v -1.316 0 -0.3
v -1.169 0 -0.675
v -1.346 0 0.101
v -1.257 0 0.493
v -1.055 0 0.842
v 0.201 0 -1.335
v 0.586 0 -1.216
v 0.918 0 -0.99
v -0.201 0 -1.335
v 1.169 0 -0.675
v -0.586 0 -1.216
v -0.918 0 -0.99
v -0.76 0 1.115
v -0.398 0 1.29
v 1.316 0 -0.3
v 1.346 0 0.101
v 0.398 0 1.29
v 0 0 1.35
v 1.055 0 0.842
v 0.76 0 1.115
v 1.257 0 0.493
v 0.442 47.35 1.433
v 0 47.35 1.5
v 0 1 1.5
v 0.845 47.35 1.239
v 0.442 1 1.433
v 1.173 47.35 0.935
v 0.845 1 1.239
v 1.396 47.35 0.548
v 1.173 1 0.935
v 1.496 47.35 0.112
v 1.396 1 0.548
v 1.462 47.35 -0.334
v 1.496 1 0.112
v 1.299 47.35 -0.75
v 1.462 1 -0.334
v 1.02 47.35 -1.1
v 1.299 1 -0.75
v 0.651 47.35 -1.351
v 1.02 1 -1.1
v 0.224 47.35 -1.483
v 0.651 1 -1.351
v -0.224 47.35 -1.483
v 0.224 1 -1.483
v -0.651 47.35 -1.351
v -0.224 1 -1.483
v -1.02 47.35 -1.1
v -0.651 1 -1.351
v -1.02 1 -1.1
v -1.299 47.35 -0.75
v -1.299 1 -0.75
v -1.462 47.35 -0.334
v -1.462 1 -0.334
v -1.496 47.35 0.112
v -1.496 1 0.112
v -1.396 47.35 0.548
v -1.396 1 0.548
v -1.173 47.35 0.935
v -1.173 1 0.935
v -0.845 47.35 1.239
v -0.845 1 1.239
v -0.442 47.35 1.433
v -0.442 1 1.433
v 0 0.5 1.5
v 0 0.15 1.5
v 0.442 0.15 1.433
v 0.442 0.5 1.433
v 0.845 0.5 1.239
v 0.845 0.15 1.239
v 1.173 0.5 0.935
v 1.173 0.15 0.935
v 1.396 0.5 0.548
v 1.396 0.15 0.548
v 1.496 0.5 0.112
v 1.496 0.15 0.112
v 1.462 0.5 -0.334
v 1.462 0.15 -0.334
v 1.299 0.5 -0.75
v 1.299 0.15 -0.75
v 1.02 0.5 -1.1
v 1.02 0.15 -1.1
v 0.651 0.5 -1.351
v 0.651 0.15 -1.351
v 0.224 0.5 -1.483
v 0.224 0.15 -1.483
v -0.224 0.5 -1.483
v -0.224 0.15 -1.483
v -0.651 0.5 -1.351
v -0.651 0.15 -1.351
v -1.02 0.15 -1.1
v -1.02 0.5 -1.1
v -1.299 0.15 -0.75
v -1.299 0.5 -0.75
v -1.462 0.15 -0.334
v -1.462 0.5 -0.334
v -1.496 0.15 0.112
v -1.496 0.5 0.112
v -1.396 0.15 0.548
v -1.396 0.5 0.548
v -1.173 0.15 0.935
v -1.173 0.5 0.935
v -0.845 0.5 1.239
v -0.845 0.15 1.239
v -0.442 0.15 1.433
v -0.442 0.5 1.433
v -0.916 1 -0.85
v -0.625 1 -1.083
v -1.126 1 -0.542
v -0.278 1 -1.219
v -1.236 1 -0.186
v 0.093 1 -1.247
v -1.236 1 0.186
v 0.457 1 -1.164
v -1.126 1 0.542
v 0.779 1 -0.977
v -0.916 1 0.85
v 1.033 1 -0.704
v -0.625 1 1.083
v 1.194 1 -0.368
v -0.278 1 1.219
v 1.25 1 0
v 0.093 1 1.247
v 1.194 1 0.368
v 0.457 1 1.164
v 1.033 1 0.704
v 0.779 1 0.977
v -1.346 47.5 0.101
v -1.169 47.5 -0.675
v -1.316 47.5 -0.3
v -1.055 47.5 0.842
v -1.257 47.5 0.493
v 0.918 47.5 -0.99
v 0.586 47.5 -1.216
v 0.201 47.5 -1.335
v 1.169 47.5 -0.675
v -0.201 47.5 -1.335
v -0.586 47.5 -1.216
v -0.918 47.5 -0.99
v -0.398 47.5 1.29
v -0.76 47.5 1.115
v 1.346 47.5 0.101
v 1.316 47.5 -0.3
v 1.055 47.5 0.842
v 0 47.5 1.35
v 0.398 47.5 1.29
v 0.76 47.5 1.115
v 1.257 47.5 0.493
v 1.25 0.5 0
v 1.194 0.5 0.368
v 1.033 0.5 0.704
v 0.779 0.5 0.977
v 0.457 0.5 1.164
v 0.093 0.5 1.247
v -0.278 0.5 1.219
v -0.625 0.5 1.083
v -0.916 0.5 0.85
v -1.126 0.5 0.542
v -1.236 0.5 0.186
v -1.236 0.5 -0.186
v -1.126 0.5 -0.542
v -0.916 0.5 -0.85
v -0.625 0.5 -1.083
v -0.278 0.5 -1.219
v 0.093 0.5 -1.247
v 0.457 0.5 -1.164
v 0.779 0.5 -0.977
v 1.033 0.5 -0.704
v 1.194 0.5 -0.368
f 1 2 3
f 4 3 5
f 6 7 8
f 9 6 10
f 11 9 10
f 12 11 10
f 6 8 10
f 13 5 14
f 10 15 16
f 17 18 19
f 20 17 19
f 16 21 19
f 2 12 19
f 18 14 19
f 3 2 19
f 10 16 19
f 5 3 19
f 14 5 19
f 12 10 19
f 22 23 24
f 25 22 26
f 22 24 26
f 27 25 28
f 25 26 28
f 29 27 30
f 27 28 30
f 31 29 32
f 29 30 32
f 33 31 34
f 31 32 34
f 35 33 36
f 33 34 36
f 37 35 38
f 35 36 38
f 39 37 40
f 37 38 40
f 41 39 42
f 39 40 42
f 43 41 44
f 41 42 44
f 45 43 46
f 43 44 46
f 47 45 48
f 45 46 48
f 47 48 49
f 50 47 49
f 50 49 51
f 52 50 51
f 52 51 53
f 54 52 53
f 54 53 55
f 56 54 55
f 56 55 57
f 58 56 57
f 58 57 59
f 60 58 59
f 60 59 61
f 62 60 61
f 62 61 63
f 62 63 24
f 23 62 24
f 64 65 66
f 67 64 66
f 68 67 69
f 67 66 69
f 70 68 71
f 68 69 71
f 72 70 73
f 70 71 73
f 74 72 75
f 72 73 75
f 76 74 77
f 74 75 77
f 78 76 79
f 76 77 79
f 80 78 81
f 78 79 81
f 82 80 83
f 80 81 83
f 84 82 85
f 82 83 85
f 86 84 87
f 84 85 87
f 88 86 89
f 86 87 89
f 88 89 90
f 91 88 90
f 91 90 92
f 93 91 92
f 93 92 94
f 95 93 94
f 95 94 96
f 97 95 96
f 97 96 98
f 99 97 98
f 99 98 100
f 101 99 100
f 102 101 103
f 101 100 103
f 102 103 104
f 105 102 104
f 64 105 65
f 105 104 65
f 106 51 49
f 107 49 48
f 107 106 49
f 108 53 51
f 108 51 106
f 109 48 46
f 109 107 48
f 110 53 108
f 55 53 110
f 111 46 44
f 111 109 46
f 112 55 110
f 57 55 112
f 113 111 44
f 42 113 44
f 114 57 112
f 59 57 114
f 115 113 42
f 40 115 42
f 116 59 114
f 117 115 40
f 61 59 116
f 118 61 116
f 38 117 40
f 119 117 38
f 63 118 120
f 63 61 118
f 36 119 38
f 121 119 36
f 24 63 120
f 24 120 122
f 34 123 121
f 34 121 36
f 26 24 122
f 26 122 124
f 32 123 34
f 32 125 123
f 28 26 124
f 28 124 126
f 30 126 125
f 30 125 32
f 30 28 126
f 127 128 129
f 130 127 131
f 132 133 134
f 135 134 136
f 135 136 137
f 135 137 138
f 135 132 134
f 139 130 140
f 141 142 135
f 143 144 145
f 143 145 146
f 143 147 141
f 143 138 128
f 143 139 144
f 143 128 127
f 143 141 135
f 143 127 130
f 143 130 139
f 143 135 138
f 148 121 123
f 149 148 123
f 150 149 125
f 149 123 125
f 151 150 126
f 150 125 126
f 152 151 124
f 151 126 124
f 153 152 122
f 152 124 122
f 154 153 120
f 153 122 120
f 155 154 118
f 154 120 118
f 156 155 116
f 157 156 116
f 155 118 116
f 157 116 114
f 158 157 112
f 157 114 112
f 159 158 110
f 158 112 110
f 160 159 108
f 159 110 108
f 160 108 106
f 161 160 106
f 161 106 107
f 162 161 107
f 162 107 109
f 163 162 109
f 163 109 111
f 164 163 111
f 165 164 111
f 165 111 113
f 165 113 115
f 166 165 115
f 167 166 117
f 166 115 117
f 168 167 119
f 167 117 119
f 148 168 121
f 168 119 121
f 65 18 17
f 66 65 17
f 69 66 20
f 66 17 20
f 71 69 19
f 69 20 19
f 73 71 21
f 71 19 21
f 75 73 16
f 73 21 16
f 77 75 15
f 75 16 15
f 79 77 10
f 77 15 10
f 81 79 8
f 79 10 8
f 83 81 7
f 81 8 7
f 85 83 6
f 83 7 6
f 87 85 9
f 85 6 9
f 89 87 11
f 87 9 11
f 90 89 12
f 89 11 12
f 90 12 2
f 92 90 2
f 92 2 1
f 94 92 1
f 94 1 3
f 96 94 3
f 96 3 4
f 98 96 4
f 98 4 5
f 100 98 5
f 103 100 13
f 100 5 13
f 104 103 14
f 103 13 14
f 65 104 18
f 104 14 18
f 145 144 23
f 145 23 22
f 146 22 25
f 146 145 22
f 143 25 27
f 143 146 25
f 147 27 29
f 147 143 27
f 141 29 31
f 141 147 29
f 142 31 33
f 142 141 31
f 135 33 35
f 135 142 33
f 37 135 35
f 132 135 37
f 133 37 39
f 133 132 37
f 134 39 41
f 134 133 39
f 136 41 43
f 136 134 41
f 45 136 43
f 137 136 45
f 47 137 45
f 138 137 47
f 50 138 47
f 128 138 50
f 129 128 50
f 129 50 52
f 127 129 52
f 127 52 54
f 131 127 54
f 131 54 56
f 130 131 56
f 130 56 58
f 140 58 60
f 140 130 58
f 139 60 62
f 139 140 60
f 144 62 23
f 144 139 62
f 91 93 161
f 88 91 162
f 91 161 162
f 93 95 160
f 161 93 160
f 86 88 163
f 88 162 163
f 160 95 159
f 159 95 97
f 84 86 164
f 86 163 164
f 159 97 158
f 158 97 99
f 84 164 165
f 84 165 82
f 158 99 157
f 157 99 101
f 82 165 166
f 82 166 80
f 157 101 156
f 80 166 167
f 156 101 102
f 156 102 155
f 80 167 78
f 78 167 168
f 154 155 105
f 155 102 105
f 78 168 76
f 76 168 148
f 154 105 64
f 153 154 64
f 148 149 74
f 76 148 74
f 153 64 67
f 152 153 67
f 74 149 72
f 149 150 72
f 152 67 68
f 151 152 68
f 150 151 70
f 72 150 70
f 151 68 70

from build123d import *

# Parameters (mm, degrees)
SKETCH1_R           = 1.5
BOSS_EXTRUDE1_DEPTH = 47.5
CHAMFER1_SIZE       = 0.15
CUT_EXTRUDE1_START  = -1
SKETCH2_R           = 1.5
SKETCH2_R_2         = 1.25
CUT_EXTRUDE1_DEPTH  = 0.5


with BuildPart() as part:
    # Sketch1 → Boss-Extrude1 (new body)
    with BuildSketch(Plane(origin=(0, 0, 0), x_dir=(1, 0, 0), z_dir=(0, 1, 0))):
        with Locations(Location((0, 0, 0), (0, 0, 270))):
            Circle(SKETCH1_R)
    extrude(amount=BOSS_EXTRUDE1_DEPTH)

    # Chamfer1
    chamfer1_edges = [part.edges().sort_by_distance(p)[0] for p in [
        (0, 0, -1.5),
        (0, 47.5, -1.5),
    ]]
    chamfer(chamfer1_edges, length=CHAMFER1_SIZE)

    # Sketch2 → Cut-Extrude1 (cut)
    with BuildSketch(Plane.XZ.offset(CUT_EXTRUDE1_START)):
        Circle(SKETCH2_R)
        Circle(SKETCH2_R_2, mode=Mode.SUBTRACT)
    extrude(amount=CUT_EXTRUDE1_DEPTH, mode=Mode.SUBTRACT)


solid = part.part
